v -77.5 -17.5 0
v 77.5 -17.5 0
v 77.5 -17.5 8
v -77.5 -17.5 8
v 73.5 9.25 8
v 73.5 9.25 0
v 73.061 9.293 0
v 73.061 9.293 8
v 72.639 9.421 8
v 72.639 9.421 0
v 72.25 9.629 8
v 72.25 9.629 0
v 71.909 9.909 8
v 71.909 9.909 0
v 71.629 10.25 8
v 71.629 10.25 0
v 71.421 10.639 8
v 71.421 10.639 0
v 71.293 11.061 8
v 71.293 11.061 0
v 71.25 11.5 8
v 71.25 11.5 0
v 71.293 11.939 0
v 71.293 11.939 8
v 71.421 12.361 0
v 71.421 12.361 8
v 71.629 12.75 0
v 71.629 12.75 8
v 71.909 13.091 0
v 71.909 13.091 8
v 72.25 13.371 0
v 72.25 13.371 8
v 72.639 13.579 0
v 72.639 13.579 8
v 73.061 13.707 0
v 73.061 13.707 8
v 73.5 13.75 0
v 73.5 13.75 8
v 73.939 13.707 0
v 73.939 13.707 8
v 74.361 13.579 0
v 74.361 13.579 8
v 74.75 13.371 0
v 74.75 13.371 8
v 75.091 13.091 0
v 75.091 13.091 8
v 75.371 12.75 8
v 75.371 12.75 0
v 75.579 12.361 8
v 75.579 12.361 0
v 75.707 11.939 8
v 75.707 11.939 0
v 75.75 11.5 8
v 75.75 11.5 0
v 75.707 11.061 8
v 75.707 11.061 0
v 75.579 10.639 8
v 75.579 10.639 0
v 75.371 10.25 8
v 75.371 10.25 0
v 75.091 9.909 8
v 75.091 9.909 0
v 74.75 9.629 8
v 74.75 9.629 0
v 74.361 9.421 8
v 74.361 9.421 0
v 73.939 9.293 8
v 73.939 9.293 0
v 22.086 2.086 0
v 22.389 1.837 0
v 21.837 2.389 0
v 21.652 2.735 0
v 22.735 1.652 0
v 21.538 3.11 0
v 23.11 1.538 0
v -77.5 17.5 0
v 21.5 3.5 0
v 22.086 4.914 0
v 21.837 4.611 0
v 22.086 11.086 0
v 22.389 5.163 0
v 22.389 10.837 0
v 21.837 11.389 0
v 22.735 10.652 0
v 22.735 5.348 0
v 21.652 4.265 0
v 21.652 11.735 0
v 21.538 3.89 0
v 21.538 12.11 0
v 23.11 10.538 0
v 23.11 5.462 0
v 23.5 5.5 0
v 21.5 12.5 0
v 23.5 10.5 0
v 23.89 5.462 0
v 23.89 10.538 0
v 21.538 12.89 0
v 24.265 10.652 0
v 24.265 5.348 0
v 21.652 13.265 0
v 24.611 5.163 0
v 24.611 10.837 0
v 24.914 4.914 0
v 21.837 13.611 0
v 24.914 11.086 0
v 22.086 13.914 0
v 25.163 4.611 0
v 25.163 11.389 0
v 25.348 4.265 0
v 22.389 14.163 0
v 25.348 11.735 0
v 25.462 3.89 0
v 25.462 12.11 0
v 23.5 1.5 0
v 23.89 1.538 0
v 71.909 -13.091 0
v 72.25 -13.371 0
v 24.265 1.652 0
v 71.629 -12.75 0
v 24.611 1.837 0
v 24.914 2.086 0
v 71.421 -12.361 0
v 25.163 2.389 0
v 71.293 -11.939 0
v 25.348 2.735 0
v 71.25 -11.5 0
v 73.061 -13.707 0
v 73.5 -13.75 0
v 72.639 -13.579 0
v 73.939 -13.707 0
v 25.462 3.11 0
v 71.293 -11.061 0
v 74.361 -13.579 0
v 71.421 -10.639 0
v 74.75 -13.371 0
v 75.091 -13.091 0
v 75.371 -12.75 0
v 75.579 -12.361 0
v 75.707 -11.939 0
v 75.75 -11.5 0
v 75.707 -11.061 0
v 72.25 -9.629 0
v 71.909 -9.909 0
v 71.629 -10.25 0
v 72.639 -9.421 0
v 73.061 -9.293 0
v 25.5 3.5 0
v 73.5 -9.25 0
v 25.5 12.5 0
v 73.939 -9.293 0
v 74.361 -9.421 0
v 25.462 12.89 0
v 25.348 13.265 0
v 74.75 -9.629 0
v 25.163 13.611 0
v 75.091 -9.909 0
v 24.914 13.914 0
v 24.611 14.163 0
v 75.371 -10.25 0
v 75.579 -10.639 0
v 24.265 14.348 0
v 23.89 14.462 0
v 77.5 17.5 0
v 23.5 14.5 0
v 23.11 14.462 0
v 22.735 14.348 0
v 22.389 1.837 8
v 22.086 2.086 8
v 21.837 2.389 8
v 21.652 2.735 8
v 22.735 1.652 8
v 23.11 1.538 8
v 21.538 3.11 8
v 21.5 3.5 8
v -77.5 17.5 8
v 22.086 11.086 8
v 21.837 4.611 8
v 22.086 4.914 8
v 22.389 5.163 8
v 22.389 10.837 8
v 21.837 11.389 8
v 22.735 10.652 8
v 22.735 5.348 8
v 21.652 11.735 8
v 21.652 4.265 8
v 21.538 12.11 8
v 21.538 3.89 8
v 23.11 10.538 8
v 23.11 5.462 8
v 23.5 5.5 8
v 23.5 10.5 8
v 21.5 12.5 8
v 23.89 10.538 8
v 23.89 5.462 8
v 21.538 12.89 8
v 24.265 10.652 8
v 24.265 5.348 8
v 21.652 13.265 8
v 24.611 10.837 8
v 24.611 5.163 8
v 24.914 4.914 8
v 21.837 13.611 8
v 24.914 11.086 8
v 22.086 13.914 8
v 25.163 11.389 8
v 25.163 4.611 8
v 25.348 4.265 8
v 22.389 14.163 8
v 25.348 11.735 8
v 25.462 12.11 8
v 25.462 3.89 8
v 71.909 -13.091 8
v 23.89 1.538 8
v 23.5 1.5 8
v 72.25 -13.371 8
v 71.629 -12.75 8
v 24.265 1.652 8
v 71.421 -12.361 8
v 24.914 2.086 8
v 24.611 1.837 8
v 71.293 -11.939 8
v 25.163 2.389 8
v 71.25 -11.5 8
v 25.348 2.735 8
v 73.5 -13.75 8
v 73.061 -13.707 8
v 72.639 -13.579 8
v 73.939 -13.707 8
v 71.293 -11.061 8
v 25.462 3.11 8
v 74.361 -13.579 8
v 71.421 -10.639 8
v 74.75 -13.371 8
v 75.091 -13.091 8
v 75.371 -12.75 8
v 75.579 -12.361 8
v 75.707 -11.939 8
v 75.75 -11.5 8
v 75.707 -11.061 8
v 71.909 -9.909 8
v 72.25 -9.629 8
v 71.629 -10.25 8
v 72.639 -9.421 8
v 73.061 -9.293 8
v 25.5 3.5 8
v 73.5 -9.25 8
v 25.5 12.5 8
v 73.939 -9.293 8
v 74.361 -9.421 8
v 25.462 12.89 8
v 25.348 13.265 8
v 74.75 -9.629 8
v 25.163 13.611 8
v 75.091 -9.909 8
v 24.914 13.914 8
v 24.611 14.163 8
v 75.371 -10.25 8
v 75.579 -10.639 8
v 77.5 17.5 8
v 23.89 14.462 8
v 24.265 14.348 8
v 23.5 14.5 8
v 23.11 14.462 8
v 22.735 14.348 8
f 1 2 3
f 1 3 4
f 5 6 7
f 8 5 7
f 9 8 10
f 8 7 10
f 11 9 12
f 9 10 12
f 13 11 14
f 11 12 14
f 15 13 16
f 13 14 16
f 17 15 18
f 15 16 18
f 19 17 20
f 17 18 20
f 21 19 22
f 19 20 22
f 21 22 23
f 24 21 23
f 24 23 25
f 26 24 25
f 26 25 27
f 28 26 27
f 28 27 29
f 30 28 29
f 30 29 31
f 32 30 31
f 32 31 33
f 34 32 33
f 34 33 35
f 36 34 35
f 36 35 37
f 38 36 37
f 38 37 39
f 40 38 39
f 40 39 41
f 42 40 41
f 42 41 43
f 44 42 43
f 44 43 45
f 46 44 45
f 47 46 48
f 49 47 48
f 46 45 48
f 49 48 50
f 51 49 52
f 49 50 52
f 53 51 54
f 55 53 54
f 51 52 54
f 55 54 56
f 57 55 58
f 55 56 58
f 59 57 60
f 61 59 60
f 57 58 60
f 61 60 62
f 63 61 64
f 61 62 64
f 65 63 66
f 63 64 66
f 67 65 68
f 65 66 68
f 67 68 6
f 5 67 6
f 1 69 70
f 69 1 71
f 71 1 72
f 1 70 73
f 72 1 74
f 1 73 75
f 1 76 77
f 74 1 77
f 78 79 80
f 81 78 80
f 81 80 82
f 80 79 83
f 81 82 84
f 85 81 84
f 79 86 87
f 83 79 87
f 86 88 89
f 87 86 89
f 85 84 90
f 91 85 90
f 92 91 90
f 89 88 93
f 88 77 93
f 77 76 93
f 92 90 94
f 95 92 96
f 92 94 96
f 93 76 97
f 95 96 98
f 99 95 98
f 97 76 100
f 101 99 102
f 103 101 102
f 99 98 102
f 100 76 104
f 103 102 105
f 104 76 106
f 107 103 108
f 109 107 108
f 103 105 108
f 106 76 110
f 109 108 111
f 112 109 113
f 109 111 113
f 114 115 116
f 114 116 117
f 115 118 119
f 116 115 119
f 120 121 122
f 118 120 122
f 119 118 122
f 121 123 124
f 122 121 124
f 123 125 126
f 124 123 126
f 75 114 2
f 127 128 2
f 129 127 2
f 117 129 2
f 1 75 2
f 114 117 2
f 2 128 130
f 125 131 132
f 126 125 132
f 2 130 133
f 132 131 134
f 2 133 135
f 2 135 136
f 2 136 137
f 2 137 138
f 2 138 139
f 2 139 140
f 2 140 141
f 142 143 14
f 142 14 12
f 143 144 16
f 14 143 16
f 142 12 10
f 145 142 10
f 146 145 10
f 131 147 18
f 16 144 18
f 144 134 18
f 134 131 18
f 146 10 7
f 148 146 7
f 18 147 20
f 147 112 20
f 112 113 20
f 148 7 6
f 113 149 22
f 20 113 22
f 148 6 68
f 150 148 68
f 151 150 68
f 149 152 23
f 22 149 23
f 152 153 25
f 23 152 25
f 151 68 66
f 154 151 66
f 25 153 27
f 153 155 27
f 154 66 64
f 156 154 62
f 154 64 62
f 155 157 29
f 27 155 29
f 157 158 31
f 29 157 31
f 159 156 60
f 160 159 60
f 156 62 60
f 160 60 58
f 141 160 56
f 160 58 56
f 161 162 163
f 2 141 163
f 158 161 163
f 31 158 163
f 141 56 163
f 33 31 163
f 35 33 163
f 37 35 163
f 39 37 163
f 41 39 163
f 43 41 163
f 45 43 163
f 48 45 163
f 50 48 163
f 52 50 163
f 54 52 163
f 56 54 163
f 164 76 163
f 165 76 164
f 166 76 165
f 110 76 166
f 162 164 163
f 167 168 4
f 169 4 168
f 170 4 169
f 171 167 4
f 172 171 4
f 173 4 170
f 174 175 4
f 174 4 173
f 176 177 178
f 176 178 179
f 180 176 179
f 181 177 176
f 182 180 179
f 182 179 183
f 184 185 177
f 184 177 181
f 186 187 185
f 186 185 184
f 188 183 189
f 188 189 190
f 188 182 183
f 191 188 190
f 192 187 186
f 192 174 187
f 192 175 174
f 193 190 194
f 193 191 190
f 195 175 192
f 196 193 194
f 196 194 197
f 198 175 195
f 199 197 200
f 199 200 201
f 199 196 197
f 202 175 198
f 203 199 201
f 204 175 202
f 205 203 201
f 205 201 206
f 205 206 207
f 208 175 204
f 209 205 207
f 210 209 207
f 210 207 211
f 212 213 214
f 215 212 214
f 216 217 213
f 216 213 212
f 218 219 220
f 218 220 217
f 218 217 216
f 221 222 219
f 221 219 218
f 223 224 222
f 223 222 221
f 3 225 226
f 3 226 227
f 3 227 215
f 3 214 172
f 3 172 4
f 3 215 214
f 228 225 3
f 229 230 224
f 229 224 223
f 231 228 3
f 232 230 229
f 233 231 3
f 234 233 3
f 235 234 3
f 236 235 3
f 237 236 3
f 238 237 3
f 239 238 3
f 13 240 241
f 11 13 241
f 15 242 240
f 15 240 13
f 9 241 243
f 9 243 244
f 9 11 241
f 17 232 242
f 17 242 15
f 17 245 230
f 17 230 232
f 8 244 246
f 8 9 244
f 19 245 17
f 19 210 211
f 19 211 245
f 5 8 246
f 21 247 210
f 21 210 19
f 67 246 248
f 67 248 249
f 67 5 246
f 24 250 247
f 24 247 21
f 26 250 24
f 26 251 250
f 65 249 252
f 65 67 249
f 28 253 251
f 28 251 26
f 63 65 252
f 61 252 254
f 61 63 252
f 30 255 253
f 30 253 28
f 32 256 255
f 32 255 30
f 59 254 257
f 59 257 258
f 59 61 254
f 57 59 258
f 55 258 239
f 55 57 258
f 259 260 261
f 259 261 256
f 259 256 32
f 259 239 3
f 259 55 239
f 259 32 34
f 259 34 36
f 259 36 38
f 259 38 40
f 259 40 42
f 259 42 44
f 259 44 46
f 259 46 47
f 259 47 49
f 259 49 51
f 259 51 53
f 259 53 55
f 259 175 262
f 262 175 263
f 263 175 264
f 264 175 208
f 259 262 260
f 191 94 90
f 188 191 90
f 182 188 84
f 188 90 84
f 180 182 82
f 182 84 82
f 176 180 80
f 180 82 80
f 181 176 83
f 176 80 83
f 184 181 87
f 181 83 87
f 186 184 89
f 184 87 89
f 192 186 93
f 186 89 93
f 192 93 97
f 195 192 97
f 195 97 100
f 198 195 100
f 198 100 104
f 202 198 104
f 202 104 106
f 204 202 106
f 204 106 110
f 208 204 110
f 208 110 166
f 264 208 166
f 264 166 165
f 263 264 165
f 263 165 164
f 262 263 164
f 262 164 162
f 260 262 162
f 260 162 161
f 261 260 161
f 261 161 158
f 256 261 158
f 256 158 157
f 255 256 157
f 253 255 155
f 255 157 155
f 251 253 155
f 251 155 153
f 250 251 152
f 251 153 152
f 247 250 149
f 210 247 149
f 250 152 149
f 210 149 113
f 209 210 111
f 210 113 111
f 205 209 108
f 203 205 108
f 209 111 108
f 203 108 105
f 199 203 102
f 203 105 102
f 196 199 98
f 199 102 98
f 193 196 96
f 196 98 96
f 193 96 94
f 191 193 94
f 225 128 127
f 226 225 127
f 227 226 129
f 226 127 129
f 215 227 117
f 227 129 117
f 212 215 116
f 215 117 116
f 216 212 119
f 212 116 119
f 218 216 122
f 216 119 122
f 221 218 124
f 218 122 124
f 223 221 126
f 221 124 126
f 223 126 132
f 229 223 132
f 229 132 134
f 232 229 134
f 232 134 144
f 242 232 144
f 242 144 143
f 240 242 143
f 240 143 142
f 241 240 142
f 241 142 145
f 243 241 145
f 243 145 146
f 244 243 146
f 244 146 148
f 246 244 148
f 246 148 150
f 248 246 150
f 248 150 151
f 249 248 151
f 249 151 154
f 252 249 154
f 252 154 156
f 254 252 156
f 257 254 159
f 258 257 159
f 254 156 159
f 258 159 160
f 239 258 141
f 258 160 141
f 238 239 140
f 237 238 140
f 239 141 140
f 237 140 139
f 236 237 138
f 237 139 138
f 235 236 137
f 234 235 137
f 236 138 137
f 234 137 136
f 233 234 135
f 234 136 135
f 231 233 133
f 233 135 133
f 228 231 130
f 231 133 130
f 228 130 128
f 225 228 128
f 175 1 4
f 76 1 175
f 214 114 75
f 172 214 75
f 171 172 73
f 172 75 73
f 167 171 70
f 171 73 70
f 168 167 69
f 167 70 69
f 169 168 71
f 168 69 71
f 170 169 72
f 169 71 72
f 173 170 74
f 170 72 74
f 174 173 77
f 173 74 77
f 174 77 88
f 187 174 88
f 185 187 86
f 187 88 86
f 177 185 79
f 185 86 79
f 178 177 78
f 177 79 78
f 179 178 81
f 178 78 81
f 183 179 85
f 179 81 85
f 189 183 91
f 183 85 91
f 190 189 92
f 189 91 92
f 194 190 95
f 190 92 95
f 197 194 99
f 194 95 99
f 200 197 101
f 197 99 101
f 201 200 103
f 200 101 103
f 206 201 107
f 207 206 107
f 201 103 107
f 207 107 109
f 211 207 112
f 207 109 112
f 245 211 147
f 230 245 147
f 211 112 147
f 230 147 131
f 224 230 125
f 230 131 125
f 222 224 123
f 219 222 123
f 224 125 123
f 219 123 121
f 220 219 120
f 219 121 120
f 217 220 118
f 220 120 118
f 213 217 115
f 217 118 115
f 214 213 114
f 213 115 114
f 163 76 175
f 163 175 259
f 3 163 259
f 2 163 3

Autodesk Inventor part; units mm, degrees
ref_plane "YZ Plane" through (0, 0, 0) normal (1, 0, 0) x (0, 1, 0)
ref_plane "XZ Plane" through (0, 0, 0) normal (0, 1, 0) x (-1, 0, 0)
ref_plane "XY Plane" through (0, 0, 0) normal (0, 0, 1) x (1, 0, 0)
sketch "Sketch1" plane through (0, 0, 0) normal (0, 0, 1) x (1, 0, 0)
  line L0 (-77.5, 17.5) -> (77.5, 17.5)
  line L1 (77.5, 17.5) -> (77.5, -17.5)
  line L2 (77.5, -17.5) -> (-77.5, -17.5)
  line L3 (-77.5, -17.5) -> (-77.5, 17.5)
  point P0 (0, 0)
  point P1 (0, 17.5)
  point P2 (-77.5, 0)
  dimension "d0" = 155
  dimension "d1" = 35
extrude "Extrusion1" add sketch "Sketch1" along normal blind 8
sketch "Sketch4" plane through (0, 0, 8) normal (0, 0, 1) x (1, 0, 0)
  line L0 (-73.5, -11.5) -> (73.5, -11.5) construction
  line L1 (73.5, -11.5) -> (73.5, 11.5) construction
  line L2 (73.5, 11.5) -> (-73.5, 11.5) construction
  line L3 (-73.5, 11.5) -> (-73.5, -11.5) construction
  line L4 (-77.5, 17.5) -> (-77.5, -17.5) construction
  line L5 (77.5, 17.5) -> (-77.5, 17.5) construction
  point P0 (0, 0)
  point P1 (-73.5, 0)
  point P2 (-77.5, 0)
  point P3 (0, 11.5)
  point P4 (0, 17.5)
  dimension "d19" = 4
  dimension "d20" = 6
hole "Hole1" at (73.5, -11.5, 8) at (73.5, 11.5, 8) direction (0, 0, -1) diameter 4.5 end through all
sketch "Sketch5" plane through (0, 0, 8) normal (0, 0, 1) x (1, 0, 0)
  circle A0 centre (23.5, 3.5) radius 2.3
  circle A1 centre (23.5, 12.5) radius 1.5001
  point P0 (0, 0)
  point P1 (98.6998, 12.5)
hole "Hole2" at (98.6998, 12.5, 8) at (23.5, 3.5, 8) at (23.5, 12.5, 8) direction (0, 0, -1) diameter 4 end through all
properties part number "0005-10-008" material "Wood (Maple)"
